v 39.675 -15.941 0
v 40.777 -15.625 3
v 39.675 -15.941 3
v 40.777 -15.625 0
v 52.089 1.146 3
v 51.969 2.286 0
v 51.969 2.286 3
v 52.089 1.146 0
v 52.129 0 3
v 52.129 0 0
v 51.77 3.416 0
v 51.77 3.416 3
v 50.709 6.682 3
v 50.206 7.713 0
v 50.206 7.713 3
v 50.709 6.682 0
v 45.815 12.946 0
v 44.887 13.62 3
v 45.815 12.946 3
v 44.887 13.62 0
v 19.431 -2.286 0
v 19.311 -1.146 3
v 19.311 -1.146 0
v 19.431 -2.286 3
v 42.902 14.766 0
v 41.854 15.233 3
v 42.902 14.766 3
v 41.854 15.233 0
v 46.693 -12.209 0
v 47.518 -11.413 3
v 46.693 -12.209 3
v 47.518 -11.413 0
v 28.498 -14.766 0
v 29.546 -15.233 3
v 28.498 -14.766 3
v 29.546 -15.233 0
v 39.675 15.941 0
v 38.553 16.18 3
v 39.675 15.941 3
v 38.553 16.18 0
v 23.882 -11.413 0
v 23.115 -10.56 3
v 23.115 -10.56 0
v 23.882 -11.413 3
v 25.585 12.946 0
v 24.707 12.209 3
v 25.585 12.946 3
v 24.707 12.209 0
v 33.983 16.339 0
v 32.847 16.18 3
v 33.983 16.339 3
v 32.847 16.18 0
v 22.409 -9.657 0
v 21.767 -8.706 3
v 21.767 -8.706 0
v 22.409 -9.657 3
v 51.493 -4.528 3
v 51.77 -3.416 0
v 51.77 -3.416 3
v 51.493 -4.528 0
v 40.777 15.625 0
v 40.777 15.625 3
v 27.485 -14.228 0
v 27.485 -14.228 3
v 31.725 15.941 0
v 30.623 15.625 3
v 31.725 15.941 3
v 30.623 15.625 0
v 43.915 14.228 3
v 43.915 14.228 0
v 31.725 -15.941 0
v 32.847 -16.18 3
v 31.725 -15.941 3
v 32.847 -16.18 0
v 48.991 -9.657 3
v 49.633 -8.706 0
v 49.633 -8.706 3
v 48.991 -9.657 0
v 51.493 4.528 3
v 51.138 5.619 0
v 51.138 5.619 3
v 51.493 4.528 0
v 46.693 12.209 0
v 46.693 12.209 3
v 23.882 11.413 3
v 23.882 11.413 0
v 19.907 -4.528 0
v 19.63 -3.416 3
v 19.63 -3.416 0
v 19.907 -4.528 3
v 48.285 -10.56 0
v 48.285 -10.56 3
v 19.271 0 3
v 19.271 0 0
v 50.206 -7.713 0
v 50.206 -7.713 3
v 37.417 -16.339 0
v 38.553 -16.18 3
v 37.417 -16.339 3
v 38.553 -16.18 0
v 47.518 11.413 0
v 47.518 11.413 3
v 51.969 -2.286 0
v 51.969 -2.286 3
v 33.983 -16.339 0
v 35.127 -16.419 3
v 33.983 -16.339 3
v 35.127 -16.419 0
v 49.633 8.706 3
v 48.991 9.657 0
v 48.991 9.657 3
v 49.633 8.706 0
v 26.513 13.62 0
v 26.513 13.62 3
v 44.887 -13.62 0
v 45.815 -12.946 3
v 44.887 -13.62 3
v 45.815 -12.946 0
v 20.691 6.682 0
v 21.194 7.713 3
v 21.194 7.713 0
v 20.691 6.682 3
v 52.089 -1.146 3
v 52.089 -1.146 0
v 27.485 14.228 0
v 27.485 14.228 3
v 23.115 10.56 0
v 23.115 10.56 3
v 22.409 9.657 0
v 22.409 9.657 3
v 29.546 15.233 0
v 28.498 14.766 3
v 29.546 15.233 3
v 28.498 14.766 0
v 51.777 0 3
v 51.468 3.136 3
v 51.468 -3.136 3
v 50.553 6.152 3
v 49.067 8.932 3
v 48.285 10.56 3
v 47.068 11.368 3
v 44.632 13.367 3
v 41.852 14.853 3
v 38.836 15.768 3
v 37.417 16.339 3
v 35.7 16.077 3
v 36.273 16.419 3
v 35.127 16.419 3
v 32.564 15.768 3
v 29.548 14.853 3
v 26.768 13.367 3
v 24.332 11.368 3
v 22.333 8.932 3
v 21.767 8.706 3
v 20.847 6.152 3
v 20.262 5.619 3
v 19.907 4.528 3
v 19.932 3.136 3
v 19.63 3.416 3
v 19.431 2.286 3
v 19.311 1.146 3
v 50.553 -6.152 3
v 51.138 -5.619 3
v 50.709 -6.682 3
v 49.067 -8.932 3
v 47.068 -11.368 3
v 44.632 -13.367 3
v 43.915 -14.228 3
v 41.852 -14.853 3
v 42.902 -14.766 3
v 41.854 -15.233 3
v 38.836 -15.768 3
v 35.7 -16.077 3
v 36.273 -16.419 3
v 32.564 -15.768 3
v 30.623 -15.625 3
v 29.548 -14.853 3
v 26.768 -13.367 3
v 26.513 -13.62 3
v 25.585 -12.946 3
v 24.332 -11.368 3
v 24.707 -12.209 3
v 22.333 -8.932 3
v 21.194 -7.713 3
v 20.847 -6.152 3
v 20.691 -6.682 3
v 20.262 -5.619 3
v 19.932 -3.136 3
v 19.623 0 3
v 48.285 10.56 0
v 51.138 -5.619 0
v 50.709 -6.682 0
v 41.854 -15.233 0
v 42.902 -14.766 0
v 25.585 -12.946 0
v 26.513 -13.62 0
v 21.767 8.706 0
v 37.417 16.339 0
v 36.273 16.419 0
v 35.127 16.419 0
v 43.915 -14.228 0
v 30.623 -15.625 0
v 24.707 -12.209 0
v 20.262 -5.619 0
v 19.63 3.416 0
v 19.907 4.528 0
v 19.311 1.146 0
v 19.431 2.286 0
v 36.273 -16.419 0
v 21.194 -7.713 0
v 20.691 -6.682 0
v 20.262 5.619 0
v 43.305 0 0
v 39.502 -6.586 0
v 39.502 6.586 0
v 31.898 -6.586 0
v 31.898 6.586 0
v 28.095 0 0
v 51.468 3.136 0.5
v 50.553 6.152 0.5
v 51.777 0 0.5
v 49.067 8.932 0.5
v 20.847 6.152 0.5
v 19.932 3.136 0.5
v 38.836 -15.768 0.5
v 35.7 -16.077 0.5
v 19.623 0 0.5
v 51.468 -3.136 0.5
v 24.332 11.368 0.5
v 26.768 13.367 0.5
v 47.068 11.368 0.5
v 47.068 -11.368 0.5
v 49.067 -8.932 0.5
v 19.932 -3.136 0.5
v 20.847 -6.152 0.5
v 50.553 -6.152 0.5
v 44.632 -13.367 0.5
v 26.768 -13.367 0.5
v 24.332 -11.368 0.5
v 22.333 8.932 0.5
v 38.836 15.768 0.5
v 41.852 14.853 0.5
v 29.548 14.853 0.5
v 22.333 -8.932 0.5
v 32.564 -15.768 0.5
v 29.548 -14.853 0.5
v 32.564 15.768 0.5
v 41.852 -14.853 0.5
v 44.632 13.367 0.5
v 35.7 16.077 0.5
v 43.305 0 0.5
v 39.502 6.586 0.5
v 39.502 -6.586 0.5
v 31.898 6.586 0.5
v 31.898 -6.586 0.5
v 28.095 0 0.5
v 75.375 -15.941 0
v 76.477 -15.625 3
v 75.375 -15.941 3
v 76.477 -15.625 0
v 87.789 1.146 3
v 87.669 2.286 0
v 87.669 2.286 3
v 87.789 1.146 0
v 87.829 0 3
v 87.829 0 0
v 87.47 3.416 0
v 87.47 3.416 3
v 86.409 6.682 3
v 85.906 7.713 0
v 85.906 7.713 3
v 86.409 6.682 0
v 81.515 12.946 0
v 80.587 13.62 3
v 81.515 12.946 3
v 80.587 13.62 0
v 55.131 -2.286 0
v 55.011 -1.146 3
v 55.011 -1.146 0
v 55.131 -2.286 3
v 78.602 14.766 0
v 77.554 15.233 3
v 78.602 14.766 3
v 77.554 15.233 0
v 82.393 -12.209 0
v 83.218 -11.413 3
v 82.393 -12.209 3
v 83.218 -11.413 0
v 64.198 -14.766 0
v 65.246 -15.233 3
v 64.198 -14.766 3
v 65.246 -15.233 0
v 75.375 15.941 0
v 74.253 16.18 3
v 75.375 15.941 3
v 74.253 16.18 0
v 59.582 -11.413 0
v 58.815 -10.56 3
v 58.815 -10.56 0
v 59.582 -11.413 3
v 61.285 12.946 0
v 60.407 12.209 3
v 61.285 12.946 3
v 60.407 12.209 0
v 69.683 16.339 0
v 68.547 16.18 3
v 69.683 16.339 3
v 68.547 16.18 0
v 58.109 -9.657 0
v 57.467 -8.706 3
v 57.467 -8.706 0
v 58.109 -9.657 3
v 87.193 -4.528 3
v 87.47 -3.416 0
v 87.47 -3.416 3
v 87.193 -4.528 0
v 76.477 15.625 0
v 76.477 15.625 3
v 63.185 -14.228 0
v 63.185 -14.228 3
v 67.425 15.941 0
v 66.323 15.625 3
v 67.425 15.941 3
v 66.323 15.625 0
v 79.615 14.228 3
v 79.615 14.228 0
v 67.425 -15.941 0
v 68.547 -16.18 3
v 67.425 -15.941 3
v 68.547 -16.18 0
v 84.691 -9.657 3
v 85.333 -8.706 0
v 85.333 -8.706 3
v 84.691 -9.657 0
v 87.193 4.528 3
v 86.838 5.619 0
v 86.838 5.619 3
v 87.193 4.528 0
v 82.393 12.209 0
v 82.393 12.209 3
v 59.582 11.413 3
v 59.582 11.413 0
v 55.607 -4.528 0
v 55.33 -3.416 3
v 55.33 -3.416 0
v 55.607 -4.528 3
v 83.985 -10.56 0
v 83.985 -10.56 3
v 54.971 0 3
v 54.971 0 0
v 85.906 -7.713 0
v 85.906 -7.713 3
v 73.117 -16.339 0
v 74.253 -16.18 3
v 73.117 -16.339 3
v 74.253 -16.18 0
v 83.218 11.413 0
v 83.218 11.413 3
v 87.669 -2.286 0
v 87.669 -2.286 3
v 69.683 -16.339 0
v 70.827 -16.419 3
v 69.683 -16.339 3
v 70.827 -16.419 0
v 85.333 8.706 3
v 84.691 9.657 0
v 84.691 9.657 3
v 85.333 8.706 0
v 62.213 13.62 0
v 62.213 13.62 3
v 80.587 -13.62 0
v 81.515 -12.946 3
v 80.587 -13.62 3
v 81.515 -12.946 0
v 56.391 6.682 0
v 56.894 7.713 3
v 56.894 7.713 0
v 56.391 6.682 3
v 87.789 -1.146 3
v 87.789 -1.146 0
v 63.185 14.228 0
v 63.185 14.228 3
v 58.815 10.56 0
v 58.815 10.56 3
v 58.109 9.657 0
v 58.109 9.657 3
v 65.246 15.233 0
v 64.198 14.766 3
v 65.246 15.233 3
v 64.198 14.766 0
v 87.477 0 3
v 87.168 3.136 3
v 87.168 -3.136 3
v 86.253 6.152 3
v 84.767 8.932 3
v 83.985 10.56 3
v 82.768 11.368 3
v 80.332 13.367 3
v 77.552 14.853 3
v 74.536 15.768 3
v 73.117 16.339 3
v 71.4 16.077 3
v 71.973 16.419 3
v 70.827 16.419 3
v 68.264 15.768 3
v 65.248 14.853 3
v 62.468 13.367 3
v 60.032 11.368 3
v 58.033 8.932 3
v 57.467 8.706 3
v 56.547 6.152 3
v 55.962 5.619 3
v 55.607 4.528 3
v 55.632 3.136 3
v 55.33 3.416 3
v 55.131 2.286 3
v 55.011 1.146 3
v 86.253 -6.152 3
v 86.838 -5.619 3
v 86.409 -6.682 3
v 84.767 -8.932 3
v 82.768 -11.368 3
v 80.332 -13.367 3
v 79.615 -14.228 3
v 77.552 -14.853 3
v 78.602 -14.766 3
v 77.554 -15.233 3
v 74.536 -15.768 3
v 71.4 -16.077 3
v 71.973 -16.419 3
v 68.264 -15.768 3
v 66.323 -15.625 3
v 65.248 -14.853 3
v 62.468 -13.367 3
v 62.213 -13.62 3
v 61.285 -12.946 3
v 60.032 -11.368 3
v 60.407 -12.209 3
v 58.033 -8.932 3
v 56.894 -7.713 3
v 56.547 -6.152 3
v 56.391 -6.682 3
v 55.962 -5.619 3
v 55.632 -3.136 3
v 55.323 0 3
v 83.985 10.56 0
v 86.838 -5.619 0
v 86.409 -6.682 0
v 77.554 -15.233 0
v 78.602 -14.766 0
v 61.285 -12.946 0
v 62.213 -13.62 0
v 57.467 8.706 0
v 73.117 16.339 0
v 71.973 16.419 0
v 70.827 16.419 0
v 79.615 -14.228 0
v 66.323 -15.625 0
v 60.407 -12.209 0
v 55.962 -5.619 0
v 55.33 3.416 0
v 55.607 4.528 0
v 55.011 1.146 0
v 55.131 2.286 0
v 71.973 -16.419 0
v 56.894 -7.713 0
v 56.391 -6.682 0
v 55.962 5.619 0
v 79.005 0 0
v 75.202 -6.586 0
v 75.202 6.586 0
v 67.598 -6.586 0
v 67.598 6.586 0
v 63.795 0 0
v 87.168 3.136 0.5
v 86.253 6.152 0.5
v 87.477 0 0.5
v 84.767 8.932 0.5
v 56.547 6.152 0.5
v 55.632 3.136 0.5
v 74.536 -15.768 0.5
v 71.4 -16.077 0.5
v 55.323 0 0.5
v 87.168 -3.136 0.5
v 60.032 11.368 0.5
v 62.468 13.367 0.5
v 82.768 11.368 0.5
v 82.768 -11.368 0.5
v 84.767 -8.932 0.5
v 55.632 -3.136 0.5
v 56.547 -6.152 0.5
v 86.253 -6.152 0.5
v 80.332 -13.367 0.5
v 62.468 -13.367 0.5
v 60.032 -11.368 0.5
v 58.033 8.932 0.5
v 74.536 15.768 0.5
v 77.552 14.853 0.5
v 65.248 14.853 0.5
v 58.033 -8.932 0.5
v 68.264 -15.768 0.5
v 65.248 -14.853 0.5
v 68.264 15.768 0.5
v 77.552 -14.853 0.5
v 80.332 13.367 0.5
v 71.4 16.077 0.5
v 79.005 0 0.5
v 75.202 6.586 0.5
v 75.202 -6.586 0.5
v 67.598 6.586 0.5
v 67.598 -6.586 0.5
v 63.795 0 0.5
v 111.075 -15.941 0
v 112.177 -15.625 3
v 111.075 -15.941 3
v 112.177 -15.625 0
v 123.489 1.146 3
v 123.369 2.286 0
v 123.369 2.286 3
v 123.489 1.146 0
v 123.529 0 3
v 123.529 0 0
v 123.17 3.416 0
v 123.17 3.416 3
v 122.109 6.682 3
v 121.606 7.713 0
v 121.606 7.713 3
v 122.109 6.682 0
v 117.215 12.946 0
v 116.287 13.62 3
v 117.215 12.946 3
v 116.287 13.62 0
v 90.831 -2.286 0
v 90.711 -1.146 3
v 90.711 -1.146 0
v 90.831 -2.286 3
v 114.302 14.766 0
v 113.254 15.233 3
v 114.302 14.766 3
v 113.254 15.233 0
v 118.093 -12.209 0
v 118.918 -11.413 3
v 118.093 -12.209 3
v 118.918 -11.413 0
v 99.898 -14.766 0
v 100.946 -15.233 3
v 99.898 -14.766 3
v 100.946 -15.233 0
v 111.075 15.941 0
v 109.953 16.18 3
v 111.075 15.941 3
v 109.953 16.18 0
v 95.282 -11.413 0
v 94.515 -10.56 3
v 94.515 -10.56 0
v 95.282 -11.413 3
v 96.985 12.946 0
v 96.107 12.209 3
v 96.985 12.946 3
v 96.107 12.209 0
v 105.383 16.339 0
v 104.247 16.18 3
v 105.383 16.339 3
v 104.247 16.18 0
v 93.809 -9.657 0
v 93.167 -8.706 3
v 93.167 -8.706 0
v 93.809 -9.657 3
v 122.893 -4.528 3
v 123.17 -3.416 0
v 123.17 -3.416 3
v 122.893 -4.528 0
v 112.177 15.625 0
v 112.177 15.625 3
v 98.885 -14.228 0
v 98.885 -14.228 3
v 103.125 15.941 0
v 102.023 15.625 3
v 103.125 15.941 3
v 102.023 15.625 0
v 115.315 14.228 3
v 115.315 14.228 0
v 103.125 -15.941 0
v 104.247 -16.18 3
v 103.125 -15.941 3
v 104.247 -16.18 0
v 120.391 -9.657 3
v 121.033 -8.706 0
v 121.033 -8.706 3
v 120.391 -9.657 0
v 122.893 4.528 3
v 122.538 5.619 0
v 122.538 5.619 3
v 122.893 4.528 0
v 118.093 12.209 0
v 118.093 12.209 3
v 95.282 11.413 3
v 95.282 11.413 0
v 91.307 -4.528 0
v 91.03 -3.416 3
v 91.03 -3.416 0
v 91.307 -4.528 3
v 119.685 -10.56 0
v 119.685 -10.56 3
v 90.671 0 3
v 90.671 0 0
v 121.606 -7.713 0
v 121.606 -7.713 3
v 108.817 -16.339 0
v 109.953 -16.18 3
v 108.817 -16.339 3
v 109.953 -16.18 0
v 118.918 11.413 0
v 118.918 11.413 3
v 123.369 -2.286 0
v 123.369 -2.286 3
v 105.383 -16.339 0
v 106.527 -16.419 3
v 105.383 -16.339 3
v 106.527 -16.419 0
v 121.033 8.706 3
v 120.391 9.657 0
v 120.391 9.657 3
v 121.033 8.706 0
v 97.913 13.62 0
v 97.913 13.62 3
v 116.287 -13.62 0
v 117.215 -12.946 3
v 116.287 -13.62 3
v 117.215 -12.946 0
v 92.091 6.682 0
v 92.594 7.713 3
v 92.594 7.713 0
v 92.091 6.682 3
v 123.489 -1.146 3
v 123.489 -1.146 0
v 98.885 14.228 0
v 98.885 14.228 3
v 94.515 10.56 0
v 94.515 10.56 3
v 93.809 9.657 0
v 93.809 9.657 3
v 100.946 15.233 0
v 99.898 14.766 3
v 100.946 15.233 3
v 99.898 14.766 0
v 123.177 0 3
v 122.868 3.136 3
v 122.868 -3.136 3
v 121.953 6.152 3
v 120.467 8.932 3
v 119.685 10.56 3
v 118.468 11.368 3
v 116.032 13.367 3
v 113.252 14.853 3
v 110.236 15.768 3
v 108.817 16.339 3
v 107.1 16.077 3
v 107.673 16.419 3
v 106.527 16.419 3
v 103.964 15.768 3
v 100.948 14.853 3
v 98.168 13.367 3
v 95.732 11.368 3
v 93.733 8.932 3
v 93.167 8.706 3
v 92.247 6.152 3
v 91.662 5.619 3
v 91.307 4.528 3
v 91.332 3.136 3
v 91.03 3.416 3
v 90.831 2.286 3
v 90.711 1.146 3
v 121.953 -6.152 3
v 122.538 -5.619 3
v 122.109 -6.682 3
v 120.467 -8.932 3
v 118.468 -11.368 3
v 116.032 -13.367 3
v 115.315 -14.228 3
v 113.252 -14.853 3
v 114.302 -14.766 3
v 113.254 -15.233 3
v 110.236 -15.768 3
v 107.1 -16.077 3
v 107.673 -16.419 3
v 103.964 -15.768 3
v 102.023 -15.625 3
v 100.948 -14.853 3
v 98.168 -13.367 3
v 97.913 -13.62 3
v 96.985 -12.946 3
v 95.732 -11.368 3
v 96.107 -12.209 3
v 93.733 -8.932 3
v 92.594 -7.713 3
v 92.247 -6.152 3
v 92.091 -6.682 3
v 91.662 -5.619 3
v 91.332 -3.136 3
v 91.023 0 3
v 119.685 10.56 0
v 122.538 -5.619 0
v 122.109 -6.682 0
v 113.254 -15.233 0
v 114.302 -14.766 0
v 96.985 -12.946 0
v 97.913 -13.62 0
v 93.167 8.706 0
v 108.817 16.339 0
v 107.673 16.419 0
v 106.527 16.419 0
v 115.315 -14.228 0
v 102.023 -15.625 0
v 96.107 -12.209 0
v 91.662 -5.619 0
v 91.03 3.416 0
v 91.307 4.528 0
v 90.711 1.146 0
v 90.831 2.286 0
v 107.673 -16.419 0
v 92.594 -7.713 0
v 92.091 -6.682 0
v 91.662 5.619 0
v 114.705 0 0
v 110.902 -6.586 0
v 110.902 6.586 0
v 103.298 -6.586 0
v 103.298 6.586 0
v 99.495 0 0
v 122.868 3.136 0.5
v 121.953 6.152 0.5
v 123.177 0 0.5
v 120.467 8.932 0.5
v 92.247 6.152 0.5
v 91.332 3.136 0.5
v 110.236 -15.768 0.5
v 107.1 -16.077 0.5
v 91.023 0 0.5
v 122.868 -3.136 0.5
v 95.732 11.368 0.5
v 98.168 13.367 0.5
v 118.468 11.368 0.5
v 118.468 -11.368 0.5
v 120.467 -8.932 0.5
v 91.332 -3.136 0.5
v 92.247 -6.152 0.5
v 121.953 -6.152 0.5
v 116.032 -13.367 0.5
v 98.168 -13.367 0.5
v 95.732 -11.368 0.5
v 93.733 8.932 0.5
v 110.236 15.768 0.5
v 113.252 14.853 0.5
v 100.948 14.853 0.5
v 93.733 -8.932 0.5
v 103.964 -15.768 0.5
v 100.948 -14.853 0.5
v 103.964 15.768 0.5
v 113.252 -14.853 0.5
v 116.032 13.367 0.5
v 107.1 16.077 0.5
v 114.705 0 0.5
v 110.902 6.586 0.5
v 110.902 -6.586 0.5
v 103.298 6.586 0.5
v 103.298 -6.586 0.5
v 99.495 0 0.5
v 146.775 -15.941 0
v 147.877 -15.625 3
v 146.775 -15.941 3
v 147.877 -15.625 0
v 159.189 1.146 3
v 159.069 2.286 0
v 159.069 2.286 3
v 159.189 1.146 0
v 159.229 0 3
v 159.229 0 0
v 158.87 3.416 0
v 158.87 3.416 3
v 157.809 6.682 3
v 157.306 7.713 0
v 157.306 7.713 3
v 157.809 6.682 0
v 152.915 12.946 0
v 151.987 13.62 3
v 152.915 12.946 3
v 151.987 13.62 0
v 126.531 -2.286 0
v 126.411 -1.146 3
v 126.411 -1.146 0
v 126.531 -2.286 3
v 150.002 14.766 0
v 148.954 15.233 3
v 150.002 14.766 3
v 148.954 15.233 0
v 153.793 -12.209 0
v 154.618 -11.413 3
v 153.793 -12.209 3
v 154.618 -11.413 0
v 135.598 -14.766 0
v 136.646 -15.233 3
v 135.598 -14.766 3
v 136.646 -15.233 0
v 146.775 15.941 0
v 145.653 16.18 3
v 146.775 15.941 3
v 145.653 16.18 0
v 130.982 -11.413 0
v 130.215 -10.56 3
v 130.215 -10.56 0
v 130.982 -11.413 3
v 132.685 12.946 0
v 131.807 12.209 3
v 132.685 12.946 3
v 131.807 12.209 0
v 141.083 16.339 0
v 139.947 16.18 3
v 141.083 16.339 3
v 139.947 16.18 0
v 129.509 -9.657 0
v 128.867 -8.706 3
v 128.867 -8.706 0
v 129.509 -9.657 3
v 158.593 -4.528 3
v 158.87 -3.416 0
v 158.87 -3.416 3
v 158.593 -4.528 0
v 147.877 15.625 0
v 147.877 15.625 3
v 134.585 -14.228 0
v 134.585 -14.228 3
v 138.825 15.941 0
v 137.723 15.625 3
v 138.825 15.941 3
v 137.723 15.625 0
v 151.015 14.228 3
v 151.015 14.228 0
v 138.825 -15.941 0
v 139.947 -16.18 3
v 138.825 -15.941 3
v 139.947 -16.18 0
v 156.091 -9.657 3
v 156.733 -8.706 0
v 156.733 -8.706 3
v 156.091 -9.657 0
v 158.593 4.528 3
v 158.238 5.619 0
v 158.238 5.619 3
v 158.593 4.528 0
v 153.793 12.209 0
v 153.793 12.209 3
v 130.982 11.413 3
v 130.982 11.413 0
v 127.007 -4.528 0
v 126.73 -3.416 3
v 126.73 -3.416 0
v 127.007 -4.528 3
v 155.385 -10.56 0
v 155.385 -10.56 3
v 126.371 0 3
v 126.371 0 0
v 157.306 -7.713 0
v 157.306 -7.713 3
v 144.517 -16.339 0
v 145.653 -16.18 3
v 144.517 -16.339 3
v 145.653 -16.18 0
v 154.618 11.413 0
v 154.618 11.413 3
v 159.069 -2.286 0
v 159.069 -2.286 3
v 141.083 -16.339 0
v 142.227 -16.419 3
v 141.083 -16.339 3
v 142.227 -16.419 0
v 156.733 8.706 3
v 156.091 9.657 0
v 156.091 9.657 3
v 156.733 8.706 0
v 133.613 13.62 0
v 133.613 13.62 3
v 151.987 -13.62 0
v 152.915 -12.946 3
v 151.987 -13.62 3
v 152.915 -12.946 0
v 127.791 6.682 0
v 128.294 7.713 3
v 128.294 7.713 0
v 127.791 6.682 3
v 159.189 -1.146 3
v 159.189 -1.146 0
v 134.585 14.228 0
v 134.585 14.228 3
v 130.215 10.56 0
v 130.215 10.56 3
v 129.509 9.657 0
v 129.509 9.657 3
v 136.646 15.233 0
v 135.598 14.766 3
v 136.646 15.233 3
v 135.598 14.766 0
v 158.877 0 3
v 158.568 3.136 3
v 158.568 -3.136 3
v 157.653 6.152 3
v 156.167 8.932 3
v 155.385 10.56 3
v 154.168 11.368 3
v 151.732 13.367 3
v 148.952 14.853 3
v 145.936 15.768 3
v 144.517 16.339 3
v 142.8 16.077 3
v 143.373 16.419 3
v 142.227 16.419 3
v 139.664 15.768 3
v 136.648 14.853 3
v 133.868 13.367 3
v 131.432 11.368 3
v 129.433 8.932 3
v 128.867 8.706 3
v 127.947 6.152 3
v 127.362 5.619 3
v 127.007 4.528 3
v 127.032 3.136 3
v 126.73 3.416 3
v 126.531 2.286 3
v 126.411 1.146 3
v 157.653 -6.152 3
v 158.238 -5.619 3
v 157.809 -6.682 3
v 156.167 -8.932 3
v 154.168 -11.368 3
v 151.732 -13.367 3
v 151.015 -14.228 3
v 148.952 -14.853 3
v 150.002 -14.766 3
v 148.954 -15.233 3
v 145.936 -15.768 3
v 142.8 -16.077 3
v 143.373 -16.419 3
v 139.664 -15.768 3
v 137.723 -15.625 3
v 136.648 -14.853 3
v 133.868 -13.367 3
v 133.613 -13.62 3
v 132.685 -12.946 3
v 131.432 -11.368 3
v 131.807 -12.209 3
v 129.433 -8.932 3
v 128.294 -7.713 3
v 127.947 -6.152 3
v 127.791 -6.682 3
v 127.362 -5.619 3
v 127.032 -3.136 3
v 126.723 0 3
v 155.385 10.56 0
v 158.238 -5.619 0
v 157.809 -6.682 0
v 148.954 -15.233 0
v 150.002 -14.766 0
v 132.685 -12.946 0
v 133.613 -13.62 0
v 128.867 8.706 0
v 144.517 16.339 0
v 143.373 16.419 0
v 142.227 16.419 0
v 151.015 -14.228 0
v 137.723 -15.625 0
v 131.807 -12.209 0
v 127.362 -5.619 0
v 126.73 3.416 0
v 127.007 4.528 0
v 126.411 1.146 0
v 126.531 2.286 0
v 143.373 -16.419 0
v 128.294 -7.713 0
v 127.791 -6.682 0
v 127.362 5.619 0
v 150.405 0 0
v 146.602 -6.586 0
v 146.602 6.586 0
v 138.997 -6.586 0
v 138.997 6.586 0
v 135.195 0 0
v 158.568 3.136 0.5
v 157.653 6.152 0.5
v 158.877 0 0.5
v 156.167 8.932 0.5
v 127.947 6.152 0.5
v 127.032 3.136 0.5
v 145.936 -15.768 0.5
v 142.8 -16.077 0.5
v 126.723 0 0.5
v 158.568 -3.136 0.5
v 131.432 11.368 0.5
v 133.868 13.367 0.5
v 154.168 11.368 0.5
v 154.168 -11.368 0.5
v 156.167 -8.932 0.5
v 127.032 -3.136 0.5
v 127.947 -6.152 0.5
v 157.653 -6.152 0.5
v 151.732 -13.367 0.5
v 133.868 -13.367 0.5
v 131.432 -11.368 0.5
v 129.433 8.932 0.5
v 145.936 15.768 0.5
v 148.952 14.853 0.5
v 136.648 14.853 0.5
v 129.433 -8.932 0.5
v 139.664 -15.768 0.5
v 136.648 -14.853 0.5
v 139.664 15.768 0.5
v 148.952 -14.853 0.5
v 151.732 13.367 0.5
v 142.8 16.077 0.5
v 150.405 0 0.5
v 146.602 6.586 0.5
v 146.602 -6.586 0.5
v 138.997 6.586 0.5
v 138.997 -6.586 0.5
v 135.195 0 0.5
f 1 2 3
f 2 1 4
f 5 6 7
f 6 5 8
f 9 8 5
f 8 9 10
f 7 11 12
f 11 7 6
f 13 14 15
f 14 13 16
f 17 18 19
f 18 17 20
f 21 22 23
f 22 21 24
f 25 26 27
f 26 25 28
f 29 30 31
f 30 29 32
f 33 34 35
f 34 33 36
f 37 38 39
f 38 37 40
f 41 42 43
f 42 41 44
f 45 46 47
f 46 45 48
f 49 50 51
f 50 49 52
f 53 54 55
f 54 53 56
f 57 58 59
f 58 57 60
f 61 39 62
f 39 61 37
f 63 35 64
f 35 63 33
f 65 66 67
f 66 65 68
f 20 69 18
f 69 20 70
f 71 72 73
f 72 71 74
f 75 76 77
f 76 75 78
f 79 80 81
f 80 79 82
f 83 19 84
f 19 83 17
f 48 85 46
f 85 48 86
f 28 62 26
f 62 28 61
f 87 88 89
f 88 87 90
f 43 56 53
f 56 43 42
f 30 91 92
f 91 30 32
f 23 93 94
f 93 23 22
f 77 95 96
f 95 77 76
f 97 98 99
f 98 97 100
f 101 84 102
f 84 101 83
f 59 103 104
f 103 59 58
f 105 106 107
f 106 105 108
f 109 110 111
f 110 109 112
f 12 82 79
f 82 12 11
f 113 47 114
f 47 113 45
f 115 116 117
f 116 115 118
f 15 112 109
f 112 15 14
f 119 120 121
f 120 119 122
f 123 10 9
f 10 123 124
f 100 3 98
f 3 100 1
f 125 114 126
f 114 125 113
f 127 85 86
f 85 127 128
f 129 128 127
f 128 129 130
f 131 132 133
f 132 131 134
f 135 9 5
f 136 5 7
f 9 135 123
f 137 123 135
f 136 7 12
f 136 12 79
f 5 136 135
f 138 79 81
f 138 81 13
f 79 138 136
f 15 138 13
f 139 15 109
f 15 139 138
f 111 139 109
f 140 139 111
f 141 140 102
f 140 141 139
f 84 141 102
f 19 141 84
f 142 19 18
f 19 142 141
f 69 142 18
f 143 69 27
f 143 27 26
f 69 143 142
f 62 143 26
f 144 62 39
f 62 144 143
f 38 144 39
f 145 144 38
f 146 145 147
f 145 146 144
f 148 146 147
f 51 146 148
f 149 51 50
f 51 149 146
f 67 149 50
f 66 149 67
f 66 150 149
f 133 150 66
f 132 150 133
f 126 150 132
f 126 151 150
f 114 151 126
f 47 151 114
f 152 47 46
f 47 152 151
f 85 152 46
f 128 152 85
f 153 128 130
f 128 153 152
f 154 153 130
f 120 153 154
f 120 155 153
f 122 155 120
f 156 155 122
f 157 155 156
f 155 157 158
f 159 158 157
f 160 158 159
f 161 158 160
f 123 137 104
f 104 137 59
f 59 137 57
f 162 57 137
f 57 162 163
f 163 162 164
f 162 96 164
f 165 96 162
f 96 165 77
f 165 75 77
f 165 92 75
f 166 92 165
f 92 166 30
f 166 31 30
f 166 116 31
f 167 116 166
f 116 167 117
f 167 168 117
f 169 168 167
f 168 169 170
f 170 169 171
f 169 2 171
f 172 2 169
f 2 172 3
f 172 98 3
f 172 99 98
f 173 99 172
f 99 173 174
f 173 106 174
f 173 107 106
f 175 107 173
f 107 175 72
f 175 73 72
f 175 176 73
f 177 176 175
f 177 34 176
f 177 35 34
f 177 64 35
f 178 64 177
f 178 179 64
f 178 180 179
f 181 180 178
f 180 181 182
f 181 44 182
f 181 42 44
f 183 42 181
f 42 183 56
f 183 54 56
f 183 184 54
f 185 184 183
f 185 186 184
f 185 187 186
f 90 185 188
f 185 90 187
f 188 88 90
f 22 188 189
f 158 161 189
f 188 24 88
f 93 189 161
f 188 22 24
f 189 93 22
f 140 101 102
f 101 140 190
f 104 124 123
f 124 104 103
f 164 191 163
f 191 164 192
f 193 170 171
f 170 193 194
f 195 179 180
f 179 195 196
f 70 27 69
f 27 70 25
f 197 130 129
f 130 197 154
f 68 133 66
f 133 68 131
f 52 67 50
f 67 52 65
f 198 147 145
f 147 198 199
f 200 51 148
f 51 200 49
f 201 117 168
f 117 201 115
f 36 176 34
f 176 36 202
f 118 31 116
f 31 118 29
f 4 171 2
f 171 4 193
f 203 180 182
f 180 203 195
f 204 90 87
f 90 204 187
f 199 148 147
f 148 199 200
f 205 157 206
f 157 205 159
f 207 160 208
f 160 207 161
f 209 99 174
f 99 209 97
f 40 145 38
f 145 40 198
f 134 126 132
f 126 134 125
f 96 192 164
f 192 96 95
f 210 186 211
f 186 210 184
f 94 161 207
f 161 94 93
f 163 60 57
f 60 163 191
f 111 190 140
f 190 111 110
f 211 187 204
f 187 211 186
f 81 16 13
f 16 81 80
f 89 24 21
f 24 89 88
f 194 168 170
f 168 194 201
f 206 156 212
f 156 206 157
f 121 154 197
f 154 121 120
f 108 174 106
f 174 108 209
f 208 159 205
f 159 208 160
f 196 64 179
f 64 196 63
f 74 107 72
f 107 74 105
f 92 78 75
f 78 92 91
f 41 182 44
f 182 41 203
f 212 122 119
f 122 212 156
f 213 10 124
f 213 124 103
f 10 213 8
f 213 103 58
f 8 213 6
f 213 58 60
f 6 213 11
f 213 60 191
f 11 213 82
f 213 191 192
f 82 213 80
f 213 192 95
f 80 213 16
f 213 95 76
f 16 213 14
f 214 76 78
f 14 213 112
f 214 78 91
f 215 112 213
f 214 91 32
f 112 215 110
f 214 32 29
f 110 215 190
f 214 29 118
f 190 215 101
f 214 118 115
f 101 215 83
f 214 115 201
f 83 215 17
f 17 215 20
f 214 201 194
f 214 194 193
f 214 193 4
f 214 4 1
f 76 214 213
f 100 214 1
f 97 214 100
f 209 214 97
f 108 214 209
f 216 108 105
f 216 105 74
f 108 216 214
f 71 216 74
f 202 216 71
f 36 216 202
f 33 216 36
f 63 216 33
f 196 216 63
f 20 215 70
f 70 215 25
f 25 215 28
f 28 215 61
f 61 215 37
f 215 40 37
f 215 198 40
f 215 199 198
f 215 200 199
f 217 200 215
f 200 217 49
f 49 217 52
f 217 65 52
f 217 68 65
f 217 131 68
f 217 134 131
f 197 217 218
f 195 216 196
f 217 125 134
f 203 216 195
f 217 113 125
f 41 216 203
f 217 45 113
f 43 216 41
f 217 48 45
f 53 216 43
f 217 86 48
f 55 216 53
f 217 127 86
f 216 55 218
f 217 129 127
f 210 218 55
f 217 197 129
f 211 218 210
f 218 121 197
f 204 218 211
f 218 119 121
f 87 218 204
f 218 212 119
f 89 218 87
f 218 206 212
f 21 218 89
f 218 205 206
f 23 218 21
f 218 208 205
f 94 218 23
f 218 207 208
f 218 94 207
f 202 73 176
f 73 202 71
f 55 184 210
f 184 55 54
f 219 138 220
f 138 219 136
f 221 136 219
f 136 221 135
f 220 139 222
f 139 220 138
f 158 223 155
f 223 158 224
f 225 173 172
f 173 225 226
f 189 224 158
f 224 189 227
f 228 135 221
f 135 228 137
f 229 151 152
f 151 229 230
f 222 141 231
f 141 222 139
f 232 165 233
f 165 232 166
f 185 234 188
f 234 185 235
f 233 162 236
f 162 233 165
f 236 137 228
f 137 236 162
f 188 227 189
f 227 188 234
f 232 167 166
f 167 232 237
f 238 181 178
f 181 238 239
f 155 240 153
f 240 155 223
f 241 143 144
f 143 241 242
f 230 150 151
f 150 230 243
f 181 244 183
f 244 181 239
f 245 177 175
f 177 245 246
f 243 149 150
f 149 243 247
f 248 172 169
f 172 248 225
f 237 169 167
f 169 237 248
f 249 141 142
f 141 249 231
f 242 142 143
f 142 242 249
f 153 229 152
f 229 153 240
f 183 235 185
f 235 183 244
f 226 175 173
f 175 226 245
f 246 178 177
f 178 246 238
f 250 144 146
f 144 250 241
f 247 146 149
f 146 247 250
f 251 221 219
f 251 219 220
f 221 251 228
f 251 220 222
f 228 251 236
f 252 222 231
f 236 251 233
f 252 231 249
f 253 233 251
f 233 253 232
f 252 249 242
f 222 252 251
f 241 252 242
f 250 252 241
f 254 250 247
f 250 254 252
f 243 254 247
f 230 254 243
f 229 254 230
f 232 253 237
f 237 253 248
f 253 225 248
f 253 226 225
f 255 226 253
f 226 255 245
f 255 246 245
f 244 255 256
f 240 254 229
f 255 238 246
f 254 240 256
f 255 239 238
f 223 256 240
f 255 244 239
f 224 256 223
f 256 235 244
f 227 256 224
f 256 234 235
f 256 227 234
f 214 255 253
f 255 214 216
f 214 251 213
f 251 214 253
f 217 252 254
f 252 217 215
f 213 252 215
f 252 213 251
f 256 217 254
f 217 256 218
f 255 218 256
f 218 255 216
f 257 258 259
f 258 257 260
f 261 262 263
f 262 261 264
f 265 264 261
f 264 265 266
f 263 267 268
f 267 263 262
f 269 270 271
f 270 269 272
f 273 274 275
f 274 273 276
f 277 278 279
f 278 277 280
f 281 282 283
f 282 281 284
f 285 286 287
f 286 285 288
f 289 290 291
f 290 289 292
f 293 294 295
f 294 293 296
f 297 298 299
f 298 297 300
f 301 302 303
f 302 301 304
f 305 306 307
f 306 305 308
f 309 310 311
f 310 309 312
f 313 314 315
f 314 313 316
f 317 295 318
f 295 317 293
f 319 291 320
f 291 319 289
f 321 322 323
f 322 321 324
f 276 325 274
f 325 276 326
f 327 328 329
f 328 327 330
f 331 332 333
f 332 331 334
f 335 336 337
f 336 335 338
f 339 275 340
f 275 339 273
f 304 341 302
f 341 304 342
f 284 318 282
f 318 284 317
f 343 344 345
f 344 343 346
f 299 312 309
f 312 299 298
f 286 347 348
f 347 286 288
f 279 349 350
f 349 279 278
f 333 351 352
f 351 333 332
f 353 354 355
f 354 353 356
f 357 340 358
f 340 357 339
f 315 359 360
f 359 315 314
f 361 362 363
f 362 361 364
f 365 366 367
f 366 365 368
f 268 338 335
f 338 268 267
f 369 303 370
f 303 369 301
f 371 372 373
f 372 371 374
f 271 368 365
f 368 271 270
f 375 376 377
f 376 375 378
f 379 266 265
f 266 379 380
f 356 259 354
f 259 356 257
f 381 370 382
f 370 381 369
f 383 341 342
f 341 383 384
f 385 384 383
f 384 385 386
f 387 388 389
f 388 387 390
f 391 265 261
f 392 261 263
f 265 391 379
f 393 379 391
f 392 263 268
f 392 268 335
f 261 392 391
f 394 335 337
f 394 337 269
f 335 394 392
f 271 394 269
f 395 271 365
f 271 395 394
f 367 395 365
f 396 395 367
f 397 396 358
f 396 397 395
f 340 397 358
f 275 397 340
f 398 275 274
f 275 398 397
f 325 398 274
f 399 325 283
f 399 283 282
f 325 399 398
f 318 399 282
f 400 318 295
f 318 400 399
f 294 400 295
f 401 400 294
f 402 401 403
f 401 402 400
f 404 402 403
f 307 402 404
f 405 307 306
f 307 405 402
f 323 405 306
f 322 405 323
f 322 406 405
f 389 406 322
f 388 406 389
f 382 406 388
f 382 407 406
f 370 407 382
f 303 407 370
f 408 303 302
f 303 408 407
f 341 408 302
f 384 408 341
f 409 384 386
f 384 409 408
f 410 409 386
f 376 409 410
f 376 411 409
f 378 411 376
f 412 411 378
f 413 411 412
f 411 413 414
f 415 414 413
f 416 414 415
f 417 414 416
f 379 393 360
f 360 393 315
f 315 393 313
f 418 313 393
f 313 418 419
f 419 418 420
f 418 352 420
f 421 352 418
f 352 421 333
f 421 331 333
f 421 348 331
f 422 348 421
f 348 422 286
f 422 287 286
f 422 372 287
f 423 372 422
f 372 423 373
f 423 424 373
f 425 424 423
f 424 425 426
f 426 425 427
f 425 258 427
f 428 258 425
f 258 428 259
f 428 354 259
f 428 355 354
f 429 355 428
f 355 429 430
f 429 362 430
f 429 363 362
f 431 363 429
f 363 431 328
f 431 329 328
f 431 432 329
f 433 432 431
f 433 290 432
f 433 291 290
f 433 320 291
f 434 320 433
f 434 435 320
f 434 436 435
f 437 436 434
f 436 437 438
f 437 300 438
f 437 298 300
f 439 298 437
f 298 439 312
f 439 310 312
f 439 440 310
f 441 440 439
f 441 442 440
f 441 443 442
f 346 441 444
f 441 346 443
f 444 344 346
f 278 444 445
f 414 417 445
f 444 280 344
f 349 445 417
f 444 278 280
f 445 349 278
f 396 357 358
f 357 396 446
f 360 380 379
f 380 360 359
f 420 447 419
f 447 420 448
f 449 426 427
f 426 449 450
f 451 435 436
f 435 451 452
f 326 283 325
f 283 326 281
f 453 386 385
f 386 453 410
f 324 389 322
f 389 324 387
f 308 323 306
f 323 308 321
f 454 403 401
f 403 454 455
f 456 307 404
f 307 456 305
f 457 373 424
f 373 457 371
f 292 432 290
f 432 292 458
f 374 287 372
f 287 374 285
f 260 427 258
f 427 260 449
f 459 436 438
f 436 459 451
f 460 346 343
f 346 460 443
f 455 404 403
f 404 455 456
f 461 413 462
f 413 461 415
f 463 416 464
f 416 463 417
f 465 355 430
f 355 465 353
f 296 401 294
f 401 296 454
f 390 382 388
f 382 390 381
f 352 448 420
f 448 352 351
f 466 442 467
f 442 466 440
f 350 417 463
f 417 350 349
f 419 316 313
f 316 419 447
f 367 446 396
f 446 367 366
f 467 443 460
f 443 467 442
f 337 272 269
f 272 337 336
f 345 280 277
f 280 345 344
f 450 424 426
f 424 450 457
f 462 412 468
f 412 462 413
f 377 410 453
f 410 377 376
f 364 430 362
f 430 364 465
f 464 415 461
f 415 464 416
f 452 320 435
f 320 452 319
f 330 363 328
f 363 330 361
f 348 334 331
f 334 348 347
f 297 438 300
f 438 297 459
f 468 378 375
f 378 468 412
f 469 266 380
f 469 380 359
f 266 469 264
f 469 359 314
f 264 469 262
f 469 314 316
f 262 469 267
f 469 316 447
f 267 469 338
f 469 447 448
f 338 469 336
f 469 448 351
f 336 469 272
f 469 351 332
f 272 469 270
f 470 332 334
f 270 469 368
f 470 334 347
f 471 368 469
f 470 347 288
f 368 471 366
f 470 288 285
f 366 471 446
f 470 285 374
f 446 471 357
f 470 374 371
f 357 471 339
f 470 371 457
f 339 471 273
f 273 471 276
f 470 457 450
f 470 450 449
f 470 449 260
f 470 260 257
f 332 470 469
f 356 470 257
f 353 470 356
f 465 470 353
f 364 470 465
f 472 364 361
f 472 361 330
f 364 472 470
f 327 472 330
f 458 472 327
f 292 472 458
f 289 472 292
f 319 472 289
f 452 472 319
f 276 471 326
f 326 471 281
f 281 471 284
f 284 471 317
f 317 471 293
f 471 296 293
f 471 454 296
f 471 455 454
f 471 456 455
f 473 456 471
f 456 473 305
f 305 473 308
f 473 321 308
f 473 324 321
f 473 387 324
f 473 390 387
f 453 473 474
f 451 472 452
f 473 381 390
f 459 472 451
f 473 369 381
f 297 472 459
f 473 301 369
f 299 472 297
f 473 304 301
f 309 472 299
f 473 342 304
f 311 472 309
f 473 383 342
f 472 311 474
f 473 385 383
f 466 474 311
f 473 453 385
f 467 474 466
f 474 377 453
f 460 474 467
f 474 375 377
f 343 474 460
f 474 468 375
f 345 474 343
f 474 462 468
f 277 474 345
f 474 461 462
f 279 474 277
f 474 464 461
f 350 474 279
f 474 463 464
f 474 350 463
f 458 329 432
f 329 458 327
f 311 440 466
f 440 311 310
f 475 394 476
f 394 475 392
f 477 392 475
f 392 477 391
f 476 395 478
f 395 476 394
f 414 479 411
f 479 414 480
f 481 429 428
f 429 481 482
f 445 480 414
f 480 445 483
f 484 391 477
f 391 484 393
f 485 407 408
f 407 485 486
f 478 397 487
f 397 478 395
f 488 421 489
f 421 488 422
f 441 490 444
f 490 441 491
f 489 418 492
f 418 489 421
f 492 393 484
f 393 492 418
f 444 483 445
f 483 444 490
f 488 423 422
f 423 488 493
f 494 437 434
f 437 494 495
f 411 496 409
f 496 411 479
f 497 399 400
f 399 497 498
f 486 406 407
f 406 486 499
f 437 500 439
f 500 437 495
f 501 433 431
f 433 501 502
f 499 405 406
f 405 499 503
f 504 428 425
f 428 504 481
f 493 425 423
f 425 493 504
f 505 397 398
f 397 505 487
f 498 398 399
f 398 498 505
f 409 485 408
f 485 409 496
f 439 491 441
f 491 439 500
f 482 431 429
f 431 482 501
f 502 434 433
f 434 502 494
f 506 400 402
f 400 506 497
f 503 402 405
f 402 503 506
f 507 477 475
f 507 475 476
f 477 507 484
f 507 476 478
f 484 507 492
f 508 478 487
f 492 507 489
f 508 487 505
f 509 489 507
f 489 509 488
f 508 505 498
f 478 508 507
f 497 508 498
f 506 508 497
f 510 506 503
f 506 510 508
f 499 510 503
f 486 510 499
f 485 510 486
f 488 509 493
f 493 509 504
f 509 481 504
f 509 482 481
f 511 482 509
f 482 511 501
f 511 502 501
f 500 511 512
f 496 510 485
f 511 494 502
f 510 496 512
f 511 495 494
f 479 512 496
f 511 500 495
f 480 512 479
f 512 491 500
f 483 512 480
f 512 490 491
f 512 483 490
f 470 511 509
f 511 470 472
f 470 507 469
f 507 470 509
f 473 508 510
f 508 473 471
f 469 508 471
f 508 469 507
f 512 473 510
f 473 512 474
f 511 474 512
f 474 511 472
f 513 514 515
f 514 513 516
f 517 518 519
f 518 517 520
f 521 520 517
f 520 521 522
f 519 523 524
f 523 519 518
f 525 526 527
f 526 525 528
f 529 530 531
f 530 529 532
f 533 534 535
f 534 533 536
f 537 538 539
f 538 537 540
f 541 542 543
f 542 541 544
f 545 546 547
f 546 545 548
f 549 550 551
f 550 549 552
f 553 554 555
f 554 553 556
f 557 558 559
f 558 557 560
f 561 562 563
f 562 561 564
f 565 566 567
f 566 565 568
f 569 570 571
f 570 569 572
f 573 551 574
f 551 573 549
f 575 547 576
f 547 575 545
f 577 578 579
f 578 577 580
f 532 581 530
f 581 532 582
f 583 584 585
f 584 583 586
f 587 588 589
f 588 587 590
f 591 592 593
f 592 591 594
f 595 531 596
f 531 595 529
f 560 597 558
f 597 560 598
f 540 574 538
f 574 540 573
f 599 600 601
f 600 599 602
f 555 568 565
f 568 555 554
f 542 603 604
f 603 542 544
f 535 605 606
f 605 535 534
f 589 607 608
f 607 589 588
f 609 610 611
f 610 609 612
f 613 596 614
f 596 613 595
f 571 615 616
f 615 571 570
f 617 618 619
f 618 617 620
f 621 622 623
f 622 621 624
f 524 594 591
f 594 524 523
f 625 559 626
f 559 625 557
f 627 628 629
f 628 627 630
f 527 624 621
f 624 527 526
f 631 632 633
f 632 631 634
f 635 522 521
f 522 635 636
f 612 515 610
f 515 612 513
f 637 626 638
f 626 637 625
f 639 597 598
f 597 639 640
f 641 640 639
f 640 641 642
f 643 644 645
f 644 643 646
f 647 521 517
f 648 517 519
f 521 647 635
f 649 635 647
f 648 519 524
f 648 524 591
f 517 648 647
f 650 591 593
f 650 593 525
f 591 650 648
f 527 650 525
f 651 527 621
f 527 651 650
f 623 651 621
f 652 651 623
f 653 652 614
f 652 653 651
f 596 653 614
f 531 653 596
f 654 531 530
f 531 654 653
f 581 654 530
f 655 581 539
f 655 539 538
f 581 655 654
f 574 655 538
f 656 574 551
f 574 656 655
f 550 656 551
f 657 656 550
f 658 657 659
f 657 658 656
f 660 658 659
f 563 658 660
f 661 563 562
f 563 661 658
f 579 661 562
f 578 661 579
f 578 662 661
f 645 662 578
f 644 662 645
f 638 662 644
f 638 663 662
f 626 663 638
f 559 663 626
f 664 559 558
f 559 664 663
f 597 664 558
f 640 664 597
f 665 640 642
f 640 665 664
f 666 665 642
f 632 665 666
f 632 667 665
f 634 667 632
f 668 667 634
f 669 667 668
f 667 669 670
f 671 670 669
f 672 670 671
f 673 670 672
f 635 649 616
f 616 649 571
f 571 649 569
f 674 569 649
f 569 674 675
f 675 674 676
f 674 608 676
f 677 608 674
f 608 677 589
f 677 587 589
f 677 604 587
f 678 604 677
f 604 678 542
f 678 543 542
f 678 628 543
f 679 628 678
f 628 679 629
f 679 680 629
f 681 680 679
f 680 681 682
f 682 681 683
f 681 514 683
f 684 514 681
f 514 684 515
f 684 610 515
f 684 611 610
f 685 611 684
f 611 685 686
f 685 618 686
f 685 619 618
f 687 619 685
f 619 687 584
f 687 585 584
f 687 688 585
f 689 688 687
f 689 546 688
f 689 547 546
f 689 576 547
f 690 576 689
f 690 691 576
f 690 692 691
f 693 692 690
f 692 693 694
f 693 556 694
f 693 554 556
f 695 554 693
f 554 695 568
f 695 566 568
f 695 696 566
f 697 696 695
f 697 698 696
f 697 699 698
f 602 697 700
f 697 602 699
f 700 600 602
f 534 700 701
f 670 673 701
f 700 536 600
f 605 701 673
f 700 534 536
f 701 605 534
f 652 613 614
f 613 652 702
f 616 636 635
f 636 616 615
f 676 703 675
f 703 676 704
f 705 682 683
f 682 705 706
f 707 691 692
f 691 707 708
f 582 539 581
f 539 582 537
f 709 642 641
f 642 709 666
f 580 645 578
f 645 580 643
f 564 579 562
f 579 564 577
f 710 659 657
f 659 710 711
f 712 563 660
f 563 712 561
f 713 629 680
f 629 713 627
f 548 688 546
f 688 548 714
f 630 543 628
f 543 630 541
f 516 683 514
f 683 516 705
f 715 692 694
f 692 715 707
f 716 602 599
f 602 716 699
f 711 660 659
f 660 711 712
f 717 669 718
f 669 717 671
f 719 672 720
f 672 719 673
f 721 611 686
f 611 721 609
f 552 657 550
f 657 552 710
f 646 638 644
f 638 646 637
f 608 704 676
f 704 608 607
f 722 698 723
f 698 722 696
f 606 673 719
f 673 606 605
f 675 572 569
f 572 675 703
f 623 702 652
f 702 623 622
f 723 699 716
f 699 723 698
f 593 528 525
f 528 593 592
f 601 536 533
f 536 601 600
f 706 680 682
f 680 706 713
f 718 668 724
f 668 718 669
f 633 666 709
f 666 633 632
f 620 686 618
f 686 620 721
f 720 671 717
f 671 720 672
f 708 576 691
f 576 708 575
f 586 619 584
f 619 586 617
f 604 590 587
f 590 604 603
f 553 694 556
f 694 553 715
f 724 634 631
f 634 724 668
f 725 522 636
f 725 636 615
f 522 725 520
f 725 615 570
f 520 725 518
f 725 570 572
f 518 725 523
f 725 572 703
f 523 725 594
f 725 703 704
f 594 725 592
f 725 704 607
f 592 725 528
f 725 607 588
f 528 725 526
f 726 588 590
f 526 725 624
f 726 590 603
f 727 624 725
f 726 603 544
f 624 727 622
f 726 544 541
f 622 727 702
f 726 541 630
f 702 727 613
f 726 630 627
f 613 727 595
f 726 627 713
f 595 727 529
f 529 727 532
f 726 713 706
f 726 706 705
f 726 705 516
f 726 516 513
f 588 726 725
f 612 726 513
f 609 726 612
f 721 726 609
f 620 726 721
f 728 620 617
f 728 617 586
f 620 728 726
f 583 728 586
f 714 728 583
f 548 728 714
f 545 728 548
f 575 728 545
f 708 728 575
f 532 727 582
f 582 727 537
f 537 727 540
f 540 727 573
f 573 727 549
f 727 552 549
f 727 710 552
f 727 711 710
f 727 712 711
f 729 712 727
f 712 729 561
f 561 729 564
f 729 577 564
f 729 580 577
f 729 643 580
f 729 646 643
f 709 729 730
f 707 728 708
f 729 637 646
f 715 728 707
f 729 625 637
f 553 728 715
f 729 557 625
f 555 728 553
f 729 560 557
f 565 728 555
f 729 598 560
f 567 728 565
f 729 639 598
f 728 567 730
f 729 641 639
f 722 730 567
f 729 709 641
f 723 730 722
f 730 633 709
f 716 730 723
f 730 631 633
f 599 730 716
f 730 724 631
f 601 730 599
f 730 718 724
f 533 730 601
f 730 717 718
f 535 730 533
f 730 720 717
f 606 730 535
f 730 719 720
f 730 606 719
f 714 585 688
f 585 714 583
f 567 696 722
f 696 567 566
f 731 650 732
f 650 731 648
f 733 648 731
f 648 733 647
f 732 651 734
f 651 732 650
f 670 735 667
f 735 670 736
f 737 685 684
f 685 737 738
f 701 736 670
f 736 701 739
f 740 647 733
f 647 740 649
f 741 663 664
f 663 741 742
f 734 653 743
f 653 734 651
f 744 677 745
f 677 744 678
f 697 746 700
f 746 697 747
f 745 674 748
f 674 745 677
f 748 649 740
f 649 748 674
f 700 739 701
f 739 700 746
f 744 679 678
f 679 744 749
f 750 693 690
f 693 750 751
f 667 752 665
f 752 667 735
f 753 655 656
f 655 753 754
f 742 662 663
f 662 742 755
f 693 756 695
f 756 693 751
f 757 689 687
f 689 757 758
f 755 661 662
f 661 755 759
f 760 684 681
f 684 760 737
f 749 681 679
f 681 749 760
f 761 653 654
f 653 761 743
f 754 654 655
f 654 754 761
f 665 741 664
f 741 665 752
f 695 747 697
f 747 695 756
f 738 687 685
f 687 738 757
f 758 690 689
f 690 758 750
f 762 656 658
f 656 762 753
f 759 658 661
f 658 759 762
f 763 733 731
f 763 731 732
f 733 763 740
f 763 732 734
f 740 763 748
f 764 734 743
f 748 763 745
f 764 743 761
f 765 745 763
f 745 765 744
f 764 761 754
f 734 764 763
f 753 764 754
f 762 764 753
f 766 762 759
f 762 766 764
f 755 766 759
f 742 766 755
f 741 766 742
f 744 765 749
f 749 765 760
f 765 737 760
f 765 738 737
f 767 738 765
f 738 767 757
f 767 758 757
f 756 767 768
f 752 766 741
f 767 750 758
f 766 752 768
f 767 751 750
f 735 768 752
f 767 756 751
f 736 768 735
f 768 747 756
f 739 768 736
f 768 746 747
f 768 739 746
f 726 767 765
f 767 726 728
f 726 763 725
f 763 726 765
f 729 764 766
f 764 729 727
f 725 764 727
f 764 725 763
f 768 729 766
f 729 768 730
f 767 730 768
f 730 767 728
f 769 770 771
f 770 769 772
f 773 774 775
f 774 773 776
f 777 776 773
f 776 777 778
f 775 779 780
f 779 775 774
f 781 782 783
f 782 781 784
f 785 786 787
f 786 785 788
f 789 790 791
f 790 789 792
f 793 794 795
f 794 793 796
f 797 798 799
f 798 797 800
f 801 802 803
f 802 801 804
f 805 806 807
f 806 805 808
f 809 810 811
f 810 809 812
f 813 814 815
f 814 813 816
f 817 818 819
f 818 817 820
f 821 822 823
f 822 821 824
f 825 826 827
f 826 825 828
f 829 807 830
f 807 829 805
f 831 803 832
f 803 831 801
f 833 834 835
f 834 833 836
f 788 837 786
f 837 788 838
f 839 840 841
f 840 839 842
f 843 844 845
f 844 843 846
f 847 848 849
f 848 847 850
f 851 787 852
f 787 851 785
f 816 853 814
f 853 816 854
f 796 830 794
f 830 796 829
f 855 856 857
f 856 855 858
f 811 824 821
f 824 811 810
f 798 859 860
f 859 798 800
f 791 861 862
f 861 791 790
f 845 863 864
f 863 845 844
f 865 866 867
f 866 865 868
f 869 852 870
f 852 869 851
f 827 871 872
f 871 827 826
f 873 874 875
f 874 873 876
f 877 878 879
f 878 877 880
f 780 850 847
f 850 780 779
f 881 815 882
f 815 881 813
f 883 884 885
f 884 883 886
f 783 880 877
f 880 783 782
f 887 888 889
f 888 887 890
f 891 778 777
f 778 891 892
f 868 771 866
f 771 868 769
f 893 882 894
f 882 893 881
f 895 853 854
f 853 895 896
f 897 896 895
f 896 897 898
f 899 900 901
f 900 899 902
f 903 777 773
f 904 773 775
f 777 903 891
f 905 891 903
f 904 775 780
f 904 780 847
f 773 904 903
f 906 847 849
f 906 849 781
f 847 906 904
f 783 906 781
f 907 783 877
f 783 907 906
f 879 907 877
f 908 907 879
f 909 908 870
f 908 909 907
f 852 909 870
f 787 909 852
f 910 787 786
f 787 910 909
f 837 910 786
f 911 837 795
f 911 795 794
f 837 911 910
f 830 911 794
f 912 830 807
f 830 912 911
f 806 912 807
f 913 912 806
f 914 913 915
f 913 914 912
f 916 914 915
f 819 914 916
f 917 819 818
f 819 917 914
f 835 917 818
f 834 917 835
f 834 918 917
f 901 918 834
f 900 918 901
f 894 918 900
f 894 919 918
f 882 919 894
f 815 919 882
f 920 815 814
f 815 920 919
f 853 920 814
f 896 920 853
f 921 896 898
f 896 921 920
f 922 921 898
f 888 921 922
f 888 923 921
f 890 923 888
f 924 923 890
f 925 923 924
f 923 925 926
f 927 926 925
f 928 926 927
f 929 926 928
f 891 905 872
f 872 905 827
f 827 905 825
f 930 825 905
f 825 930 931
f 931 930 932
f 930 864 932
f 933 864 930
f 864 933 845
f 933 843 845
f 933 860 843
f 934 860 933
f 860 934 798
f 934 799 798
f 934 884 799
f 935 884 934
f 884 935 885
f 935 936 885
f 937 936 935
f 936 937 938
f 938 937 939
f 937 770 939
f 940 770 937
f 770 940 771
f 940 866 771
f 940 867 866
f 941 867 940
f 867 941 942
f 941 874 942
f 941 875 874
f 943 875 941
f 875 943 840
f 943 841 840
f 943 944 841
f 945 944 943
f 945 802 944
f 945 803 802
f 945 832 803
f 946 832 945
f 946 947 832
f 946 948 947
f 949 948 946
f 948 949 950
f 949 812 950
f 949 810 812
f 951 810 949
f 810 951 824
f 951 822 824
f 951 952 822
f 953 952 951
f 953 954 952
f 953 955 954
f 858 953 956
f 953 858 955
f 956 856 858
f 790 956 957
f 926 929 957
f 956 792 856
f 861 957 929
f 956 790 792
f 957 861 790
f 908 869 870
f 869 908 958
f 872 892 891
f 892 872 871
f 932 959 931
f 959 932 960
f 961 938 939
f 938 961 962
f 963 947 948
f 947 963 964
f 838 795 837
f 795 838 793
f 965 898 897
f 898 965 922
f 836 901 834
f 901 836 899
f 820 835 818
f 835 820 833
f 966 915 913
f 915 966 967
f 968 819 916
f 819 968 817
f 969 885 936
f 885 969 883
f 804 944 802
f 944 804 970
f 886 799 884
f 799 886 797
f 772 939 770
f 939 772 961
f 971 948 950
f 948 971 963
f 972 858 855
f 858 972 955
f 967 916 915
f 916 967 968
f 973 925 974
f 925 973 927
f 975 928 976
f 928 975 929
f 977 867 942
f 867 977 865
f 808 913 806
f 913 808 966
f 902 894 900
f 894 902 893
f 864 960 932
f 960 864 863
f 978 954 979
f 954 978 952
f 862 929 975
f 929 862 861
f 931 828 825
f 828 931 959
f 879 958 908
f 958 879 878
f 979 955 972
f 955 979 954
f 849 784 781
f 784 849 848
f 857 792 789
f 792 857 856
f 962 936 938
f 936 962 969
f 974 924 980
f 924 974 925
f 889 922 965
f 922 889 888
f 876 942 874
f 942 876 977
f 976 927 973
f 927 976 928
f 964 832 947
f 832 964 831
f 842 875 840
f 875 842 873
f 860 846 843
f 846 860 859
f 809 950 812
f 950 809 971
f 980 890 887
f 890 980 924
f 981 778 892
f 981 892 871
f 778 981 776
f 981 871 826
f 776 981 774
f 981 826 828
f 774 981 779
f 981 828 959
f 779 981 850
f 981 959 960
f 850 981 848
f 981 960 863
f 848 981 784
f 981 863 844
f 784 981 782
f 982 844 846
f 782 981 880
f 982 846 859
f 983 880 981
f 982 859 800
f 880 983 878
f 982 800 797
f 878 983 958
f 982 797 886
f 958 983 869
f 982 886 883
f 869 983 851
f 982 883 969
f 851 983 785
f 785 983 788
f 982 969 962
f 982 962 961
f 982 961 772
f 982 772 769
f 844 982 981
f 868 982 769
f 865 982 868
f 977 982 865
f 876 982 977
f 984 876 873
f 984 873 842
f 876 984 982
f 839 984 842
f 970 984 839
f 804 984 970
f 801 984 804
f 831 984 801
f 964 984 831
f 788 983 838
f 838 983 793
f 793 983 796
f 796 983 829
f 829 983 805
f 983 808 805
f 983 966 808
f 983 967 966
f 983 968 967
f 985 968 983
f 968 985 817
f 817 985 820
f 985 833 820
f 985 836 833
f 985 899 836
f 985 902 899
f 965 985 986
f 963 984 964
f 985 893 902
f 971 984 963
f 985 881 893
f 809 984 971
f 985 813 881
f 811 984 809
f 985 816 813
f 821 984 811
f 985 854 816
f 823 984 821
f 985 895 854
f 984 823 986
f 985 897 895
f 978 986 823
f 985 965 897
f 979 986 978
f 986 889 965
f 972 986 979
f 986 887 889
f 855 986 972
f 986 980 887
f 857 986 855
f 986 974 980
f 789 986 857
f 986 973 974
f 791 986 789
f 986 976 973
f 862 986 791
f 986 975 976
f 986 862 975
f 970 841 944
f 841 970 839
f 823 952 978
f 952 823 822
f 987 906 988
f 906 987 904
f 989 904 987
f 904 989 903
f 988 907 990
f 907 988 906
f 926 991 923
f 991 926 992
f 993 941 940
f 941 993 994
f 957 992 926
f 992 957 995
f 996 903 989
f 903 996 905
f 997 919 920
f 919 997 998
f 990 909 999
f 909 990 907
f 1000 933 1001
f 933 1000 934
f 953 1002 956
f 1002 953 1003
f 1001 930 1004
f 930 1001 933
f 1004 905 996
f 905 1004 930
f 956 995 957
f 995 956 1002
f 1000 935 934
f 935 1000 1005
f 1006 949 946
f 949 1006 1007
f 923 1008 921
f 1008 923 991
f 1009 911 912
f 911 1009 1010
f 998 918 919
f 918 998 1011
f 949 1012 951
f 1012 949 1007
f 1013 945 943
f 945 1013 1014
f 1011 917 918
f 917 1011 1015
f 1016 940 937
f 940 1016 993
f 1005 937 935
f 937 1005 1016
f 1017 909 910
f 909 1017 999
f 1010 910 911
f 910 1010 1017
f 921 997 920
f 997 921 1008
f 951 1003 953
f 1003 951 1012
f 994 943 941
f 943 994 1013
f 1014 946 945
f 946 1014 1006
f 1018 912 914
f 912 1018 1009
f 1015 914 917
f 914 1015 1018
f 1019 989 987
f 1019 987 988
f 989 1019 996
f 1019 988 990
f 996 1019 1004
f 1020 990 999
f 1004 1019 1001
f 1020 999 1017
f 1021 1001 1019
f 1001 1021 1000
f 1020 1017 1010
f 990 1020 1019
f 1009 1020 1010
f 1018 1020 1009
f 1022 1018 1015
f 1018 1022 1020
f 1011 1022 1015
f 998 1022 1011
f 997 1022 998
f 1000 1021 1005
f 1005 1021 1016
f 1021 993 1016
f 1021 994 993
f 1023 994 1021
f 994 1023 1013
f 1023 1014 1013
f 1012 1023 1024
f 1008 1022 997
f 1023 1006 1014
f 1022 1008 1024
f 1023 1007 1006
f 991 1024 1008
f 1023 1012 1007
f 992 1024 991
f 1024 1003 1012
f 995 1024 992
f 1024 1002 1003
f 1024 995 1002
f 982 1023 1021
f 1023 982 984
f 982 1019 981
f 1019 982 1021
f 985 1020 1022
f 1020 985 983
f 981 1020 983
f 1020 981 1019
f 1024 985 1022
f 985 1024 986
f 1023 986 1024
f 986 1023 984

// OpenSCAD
// Program:    24mm_washer_cap.scad
//
// Function: OpenSCAD program to define a plastic washer cap for
//           3D-print.
//
// Author:   Kjell Arne Rekaa (kjell.arne.rekaa@gmail.com)
// 
// Date:     2024-05-18
// ======================================================================

// Speed up rendering - low resolution only for preview: 
$fn = $preview ? 32 : 90; 

hole_diam  = 13;
wash_size  = 23.8;           // Washer size in millimeter

count      = 4;              // Number of caps
distance   = 1.50;           // Distance factor between caps

wash_hight  = 3;             // Hight for the nut/bolt head
friction   = 1.170;          // Friction factor. Higher: less friction
cyl_thick  = 1.18;           // Cylinder thickness: 1.28 > 1.30
size = wash_size * friction; 
// Will give right friction


// hexagon carving to fit on a nut or bolt head
module washer(size, height=wash_hight){
    cylinder(h=height, d=size/cos(180/6),center=true, $fn=32);
}

// Produce "count" number of equal caps:
for (i = [1:1:count]) {
  translate([i*distance*wash_size,0,0]) { 
  
    difference() {
      union() {
        difference(){
            cylinder(h=wash_hight, d=size*cyl_thick);
            washer(size, wash_hight+5);
        }
        cylinder(h=wash_hight-2.5, d=size*cyl_thick);
    }
        cylinder(h=wash_hight+6, d=hole_diam*friction, $fn=6);
   }
}
}
